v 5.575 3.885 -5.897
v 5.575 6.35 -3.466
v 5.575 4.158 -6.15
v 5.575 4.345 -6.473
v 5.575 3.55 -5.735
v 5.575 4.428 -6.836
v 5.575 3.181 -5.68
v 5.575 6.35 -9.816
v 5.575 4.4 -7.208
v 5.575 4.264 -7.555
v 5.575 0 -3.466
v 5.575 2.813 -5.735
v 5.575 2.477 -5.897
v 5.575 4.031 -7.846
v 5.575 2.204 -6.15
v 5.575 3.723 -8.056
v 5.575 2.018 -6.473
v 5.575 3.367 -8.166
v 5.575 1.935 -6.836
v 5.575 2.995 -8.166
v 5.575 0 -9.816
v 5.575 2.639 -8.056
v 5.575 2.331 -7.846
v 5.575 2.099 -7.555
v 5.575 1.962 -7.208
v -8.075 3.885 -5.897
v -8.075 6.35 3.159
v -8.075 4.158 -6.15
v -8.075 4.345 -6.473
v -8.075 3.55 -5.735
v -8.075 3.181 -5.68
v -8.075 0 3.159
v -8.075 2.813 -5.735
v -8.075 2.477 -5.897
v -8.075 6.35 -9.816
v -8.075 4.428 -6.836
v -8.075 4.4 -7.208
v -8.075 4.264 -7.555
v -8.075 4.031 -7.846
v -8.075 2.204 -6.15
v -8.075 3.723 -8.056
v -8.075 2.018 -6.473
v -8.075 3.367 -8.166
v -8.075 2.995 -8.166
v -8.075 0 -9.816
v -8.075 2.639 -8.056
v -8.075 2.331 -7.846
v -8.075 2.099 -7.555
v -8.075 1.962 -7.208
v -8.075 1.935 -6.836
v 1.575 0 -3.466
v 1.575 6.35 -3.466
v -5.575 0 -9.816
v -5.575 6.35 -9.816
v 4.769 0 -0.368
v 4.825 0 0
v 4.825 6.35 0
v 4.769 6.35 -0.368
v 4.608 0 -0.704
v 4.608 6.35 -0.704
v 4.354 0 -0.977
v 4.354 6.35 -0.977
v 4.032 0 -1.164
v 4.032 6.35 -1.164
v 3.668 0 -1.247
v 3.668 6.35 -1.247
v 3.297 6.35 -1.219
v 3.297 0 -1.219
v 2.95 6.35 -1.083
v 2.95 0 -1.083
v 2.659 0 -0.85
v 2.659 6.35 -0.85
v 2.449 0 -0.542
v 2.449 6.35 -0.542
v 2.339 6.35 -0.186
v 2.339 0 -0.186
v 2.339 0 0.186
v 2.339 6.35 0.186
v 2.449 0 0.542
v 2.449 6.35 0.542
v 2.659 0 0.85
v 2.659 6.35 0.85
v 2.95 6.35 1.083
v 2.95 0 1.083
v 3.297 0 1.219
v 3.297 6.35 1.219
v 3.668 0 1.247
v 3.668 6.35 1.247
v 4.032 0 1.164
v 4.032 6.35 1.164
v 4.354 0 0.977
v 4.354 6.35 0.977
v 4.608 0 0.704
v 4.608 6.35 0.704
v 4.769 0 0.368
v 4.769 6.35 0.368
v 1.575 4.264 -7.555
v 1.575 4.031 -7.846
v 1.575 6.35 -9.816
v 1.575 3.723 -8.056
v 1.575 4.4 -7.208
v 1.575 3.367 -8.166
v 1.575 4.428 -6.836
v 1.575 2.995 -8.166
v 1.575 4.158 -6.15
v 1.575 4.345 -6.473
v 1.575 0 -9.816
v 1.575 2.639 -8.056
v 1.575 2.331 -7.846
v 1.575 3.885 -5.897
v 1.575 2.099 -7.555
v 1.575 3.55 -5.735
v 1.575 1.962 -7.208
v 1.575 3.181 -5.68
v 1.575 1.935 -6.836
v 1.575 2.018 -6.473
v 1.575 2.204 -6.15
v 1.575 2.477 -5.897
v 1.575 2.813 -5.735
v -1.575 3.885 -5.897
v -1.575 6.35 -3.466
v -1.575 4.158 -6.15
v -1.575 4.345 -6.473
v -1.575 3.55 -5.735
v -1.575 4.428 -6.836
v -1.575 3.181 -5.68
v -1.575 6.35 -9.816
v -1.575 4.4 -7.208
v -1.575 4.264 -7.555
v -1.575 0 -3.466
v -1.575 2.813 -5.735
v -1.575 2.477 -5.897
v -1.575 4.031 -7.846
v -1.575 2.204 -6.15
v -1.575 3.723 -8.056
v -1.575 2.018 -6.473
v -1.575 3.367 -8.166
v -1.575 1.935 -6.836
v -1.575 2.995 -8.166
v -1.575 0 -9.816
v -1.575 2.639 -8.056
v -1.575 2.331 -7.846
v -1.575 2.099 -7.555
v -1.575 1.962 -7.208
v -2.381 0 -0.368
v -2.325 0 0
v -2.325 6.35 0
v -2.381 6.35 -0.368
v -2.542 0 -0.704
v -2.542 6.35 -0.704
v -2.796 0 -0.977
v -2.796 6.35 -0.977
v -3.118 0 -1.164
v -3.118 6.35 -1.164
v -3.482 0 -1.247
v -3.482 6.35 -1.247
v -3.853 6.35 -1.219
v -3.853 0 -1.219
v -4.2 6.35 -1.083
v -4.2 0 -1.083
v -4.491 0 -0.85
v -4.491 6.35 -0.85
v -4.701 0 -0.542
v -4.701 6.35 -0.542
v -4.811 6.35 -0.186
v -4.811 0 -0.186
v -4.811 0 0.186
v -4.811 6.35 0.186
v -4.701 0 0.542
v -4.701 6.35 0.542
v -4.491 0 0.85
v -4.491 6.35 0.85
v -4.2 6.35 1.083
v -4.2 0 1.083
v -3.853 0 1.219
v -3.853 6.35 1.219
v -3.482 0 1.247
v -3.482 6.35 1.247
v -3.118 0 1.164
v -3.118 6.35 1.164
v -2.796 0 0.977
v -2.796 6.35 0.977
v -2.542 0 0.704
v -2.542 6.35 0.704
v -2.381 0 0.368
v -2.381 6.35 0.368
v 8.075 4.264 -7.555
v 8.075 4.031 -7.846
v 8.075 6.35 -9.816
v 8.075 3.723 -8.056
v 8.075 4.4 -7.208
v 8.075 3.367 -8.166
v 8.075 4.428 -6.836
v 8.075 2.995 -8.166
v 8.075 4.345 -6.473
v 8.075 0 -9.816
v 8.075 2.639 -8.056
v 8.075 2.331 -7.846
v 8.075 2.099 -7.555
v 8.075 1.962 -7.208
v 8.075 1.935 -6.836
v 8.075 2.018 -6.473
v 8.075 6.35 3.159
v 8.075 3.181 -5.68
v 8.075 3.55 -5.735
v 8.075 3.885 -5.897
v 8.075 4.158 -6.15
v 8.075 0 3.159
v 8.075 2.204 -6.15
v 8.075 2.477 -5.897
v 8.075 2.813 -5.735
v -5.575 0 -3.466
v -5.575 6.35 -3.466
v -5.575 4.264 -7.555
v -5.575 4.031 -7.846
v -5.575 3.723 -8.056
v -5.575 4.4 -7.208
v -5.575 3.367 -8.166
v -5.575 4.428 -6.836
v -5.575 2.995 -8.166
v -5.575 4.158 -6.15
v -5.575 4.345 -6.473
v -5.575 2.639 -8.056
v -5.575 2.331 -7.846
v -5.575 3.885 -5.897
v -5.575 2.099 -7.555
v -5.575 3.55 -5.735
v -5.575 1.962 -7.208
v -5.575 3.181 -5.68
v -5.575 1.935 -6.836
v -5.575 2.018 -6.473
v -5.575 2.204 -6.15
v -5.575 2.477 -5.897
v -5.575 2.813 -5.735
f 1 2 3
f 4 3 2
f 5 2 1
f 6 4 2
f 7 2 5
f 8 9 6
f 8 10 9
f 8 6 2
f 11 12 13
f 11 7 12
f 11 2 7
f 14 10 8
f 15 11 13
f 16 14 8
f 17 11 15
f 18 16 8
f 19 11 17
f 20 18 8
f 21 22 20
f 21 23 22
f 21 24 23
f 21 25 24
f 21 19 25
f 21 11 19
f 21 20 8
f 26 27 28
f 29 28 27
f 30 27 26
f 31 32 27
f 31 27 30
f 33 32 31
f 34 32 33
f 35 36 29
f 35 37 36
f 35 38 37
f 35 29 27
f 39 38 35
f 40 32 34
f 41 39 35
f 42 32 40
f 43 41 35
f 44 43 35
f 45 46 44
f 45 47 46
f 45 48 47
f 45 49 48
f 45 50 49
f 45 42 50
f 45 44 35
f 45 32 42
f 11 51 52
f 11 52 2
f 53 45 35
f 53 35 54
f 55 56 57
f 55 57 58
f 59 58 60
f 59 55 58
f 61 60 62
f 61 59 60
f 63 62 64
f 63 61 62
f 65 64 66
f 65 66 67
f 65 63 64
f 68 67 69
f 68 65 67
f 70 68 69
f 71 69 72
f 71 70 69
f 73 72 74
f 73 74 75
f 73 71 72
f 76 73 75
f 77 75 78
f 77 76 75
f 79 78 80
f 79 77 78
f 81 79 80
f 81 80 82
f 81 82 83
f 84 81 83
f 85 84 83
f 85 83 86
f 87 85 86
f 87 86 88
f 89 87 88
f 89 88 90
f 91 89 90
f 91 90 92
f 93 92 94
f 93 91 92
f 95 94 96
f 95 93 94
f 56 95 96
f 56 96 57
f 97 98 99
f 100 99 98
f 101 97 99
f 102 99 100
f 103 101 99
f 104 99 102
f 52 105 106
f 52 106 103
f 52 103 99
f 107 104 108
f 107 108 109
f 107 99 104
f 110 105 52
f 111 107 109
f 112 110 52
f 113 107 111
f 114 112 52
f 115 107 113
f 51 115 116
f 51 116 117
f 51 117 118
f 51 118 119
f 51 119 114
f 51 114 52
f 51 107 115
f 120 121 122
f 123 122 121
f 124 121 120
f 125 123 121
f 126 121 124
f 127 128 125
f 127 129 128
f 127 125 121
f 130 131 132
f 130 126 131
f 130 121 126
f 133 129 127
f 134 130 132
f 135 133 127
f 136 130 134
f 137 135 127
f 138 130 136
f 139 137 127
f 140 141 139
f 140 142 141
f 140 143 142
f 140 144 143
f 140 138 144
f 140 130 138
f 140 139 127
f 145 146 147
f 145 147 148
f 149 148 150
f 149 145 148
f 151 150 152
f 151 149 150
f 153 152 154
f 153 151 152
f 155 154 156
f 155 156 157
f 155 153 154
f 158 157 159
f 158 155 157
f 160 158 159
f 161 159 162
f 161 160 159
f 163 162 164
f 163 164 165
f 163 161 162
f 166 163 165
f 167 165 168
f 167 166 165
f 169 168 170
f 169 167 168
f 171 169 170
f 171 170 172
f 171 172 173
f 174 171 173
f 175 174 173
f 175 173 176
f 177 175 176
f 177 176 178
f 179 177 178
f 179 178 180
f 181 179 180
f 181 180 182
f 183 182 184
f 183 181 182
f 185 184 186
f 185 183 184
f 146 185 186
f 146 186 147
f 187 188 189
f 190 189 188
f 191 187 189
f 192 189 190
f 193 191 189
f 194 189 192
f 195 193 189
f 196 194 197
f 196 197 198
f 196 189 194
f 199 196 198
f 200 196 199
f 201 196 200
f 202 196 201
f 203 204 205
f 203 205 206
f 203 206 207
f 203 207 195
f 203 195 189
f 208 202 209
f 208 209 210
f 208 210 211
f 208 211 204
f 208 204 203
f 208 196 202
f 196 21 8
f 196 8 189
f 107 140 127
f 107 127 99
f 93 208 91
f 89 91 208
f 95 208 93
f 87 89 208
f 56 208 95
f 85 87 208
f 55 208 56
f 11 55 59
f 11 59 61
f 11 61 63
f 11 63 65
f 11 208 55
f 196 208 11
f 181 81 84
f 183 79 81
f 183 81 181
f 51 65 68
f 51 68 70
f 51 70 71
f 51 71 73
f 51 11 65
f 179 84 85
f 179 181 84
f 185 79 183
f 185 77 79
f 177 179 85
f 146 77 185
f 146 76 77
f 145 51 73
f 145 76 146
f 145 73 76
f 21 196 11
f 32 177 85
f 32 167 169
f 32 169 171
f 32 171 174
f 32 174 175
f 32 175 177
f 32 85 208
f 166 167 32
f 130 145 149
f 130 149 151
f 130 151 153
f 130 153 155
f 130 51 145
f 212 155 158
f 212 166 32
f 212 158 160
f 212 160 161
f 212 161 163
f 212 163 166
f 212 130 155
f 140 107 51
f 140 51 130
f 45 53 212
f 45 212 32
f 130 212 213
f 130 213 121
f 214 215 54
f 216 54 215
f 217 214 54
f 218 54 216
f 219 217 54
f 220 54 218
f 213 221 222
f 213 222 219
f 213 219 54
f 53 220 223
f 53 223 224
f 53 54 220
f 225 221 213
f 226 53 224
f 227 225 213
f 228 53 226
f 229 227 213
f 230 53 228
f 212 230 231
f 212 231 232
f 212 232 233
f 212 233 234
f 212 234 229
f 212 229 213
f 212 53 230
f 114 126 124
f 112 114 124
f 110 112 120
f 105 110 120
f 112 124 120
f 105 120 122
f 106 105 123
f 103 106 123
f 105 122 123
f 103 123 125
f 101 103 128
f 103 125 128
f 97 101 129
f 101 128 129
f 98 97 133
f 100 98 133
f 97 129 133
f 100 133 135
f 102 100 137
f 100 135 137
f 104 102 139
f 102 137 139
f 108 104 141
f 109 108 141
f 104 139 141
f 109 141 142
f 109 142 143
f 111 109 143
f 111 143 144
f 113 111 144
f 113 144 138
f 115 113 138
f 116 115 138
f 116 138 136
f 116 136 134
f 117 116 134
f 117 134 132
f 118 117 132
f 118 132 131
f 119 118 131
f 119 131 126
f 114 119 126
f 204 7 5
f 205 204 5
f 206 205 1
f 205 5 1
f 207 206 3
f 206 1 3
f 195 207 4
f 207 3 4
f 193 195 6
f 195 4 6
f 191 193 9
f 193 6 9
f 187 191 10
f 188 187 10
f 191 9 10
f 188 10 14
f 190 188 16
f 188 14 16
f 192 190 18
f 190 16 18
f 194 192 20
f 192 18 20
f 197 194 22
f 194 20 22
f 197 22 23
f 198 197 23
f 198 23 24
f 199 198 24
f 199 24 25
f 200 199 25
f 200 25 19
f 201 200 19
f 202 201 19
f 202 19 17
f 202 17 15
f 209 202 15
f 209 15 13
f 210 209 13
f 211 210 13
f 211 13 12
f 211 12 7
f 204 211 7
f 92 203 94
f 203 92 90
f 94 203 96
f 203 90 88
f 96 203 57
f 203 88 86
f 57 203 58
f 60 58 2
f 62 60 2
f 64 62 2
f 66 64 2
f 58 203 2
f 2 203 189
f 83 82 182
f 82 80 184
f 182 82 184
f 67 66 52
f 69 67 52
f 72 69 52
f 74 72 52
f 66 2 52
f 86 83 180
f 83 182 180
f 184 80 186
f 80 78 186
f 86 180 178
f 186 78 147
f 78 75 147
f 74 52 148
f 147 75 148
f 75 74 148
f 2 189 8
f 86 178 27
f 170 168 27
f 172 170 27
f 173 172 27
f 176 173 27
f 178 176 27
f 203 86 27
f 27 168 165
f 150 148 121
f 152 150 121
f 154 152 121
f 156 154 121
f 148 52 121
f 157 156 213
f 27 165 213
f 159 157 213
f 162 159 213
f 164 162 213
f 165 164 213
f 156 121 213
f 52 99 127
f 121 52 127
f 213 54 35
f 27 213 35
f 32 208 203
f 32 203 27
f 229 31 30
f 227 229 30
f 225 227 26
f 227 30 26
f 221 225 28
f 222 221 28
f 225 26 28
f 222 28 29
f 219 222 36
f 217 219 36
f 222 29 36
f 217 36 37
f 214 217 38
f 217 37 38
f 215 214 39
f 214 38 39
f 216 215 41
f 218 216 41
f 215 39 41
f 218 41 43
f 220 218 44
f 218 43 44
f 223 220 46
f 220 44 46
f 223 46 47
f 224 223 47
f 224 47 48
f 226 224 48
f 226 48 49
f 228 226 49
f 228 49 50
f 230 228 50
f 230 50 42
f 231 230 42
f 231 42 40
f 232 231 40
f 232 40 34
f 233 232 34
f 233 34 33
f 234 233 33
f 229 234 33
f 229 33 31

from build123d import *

# Parameters (mm, degrees)
SKETCH2_R           = 1.25
BOSS_EXTRUDE1_DEPTH = 6.35
SKETCH4_R           = 1.25
CUT_EXTRUDE1_DEPTH  = 17.15


with BuildPart() as part:
    # Sketch2 → Boss-Extrude1 (new body)
    with BuildSketch(Plane(origin=(0, 0, 0), x_dir=(1, 0, 0), z_dir=(0, 1, 0))):
        Polygon((-8.075, 9.816272133), (-5.575, 9.816272133), (-5.575, 3.466272133), (-1.575, 3.466272133), (-1.575, 9.816272133), (1.575, 9.816272133), (1.575, 3.466272133), (5.575, 3.466272133), (5.575, 9.816272133), (8.075, 9.816272133), (8.075, -3.158727867), (-8.075, -3.158727867), align=None)
        with Locations((-3.575, 0)):
            Circle(SKETCH2_R, mode=Mode.SUBTRACT)
        with Locations((3.575, 0)):
            Circle(SKETCH2_R, mode=Mode.SUBTRACT)
    extrude(amount=BOSS_EXTRUDE1_DEPTH)

    # Sketch4 → Cut-Extrude1 (cut, through all)
    with BuildSketch(Plane.ZY.offset(8.075)):
        with Locations((-6.929673598, 3.181098015)):
            Circle(SKETCH4_R)
    extrude(amount=-CUT_EXTRUDE1_DEPTH, mode=Mode.SUBTRACT)


solid = part.part
